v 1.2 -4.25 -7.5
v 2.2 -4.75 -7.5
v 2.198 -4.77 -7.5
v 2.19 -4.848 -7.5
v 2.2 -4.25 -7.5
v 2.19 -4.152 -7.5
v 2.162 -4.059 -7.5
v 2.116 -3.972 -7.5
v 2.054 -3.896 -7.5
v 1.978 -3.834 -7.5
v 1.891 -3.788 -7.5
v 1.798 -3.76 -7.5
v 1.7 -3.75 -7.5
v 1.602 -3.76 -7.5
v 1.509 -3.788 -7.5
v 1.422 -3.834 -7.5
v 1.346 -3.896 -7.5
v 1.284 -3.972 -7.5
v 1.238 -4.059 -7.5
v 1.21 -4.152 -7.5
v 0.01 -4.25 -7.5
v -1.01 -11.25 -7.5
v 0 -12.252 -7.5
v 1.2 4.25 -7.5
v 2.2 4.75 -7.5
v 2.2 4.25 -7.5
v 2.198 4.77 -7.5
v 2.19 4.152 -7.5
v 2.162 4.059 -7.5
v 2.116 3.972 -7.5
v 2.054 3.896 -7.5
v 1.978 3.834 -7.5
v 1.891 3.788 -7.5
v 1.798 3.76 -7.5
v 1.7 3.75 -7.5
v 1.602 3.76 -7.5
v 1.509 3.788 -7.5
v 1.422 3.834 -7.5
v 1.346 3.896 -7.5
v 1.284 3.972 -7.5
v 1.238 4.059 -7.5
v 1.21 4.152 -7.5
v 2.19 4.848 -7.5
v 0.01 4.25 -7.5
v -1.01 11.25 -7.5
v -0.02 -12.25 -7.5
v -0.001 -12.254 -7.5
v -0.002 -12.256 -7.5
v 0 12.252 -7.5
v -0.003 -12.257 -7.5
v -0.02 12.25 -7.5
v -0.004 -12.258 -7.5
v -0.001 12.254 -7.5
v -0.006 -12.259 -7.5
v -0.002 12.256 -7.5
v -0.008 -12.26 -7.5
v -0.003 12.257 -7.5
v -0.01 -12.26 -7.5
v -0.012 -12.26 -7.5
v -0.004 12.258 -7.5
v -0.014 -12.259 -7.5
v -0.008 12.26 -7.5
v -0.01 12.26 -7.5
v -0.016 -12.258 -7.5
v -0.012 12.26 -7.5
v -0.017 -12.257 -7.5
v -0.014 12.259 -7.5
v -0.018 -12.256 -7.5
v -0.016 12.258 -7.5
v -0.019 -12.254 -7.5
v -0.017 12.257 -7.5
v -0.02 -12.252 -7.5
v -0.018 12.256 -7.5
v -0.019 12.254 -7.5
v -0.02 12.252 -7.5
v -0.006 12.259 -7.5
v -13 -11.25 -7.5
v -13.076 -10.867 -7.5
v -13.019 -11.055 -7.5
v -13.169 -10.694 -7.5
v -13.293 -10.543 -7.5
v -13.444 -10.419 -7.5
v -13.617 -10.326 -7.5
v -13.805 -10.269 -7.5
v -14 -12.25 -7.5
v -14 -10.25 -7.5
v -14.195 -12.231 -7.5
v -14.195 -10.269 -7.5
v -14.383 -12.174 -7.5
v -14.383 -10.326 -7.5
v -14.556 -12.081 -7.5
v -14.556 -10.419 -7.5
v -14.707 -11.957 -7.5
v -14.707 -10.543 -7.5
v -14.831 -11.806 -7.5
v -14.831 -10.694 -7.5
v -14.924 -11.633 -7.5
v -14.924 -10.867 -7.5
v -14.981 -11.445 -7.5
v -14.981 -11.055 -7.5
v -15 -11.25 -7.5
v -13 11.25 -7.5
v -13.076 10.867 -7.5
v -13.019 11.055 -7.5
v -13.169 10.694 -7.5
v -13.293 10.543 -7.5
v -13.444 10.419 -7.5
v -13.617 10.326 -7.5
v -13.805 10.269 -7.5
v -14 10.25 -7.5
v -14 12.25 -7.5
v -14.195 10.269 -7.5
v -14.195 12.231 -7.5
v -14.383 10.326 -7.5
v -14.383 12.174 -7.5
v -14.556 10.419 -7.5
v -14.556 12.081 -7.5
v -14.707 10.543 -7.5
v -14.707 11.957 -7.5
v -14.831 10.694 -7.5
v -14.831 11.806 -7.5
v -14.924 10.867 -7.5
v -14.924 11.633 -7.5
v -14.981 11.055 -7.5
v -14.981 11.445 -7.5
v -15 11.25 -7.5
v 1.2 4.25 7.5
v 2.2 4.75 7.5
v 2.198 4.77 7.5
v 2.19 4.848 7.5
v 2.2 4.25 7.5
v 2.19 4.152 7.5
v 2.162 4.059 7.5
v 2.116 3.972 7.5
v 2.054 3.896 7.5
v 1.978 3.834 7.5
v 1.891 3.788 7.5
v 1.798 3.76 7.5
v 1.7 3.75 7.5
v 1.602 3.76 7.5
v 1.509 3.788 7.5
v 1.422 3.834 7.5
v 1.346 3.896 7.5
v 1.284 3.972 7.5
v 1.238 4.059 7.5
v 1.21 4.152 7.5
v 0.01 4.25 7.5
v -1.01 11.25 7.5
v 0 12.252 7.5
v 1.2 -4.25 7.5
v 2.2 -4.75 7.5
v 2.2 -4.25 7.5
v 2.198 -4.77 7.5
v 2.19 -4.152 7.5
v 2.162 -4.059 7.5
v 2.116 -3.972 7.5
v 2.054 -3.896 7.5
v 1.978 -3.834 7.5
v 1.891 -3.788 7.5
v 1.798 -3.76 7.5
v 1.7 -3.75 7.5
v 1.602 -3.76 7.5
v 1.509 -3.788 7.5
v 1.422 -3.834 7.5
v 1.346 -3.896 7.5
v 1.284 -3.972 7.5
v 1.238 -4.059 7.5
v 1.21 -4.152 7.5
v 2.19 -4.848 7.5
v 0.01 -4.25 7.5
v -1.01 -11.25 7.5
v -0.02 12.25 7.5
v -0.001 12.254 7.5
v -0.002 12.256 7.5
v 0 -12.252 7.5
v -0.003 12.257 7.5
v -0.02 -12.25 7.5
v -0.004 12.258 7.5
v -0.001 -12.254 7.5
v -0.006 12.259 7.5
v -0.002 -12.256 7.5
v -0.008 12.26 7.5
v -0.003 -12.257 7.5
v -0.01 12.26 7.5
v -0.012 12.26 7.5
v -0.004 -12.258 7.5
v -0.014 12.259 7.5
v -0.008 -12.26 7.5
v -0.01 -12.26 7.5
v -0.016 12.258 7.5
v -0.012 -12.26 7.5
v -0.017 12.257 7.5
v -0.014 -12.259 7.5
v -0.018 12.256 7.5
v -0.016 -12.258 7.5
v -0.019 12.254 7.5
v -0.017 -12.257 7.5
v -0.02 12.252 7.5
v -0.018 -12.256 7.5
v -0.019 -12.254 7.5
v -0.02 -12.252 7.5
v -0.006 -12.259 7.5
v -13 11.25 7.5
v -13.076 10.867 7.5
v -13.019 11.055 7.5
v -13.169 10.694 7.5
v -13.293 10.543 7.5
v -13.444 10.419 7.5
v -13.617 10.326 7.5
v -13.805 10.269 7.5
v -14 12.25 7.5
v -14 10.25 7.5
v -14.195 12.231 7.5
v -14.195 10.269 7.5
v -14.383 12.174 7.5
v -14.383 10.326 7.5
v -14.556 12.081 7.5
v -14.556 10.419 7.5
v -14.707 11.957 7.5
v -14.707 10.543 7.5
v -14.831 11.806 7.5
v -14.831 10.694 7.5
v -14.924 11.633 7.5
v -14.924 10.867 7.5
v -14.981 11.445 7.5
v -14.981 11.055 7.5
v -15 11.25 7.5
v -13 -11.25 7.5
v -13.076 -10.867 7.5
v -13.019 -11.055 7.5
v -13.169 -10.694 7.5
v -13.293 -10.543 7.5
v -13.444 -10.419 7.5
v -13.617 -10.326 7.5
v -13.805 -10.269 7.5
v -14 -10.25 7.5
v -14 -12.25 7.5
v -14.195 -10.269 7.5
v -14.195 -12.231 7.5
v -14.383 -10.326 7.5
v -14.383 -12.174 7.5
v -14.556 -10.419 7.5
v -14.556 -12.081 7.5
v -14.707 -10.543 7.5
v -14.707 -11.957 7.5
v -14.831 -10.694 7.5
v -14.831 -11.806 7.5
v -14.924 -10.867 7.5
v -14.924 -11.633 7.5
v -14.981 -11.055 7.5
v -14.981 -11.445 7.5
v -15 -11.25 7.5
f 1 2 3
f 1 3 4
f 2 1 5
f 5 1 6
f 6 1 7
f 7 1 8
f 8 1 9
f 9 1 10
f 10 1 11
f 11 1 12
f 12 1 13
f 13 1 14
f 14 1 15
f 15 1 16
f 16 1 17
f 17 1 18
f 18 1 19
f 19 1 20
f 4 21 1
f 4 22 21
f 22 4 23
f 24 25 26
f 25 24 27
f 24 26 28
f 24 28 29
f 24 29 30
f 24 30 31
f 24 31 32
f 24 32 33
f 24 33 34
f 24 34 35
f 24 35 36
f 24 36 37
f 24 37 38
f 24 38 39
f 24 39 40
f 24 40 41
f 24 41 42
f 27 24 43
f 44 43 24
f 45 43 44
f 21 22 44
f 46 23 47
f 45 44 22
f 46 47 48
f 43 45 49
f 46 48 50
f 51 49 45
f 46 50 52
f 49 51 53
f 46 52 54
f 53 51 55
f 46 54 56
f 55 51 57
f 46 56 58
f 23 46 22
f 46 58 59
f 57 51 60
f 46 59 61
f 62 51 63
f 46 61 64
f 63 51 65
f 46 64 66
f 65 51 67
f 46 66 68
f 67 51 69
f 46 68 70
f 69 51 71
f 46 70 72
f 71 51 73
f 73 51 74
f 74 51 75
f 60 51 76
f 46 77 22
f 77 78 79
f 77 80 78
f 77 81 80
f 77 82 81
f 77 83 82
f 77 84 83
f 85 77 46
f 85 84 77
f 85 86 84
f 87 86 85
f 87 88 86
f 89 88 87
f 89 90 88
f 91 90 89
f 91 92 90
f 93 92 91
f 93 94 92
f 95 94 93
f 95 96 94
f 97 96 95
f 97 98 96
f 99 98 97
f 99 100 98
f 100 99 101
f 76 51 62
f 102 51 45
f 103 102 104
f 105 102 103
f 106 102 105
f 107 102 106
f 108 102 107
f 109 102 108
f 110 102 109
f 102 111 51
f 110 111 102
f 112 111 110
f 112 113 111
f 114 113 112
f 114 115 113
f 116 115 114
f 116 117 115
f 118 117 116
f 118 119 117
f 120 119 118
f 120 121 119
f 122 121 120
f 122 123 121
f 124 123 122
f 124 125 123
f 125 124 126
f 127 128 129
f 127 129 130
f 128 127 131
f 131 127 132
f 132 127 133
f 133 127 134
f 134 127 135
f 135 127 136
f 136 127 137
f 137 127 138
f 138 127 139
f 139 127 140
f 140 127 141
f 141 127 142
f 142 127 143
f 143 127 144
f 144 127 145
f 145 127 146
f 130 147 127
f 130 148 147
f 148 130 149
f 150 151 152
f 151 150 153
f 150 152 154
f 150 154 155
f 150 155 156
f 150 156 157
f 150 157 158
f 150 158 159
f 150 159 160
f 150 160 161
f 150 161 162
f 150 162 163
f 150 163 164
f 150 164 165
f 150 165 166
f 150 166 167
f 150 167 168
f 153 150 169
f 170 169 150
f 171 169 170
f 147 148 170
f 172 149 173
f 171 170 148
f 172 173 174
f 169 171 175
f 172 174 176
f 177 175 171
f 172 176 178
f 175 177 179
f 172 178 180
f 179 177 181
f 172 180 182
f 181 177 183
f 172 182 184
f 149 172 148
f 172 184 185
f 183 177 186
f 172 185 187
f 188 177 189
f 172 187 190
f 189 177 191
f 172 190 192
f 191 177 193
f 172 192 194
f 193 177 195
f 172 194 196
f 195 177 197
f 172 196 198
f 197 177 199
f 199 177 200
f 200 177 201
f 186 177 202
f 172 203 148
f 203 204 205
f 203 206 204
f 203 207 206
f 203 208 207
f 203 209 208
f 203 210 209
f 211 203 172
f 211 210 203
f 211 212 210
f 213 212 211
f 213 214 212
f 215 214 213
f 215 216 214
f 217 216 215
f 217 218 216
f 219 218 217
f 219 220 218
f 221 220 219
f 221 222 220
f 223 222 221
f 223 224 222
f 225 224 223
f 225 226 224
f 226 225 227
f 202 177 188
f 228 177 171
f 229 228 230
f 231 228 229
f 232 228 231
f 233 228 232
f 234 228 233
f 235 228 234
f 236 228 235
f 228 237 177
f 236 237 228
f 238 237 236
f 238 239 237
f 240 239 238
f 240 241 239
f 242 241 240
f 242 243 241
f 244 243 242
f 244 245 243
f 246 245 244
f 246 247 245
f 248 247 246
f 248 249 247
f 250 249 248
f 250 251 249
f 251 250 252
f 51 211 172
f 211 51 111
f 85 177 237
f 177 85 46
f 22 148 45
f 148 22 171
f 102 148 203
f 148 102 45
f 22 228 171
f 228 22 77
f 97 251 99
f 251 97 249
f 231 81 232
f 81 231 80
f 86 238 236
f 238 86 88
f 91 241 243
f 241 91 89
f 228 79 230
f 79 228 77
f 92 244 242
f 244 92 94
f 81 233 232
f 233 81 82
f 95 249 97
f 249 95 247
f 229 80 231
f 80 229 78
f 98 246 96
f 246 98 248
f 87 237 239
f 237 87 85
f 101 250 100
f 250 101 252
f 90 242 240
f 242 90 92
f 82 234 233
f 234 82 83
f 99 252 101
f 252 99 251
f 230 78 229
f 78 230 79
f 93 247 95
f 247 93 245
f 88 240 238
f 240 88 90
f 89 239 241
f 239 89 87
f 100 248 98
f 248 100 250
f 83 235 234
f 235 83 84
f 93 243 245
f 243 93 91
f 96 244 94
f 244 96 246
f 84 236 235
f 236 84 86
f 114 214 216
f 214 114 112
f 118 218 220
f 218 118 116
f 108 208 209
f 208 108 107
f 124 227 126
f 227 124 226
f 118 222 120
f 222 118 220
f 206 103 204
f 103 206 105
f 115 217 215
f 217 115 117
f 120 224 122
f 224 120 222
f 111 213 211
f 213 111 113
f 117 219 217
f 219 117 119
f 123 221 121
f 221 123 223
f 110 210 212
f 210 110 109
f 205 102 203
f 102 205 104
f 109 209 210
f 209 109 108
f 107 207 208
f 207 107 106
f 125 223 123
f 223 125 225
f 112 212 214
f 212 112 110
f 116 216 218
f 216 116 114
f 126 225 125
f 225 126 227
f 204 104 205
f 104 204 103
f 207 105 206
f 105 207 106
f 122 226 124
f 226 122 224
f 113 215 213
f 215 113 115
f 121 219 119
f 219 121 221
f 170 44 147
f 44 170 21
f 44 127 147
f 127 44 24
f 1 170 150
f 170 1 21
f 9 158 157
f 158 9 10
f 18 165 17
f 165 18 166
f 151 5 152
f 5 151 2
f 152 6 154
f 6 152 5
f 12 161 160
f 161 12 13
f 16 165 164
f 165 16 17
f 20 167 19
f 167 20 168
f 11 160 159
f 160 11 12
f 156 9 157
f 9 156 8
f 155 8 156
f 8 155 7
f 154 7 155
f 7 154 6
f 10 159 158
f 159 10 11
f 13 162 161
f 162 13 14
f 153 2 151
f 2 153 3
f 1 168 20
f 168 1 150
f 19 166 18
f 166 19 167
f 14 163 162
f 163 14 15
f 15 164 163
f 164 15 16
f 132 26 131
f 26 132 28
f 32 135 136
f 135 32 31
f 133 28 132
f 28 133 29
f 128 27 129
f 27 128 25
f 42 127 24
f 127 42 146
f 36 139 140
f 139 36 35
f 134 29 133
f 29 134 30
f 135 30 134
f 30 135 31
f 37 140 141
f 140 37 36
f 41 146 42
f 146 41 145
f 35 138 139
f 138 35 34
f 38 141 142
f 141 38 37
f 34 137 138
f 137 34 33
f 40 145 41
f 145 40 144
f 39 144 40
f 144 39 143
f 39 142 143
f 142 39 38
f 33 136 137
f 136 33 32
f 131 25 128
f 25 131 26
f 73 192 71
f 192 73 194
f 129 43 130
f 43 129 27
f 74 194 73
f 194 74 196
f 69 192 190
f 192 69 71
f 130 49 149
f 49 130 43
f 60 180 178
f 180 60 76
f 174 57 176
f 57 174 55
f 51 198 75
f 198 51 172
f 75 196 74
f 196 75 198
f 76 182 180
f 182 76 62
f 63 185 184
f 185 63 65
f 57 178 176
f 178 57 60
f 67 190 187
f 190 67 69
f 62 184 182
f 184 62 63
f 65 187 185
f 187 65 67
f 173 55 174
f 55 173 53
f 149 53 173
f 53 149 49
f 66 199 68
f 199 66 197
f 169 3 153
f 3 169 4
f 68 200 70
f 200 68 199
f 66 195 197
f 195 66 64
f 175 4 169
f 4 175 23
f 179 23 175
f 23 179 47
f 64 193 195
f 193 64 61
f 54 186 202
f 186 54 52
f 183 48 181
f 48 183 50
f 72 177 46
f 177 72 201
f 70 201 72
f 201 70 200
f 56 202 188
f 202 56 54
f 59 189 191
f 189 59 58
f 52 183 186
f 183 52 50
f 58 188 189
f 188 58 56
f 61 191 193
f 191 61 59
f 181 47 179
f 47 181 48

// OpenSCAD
// Parametric LED Strip Holder for Board Edges
// https://www.thingiverse.com/thing:3496300
// by Bike Cyclist
// https://www.thingiverse.com/Bikecyclist


// Width of the clamped board
w_board = 22.5;

// Net height of the clamped length
h_board = 12;

// Radius of the clamping-end cylinder
r_board = 1;

// Width of the LED strip (including tolerance)
w_led = 8.5;

// Height of the LED strip (including tolerance)
h_led = 1.2;

// Radius of the LED strip retaining arc
r_led = 0.5;

// Thickness of the clamp features
th_clamp = 1;

// Length of the clamp
l_clamp = 15;

// Number of facets
$fn = 32;

// Small distance to ensure proper meshing
eps = 0.01;

rotate ([0, 90, 0])
{
    halfclamp (w_board, h_board, r_board, 0);

    translate ([0, 0, -th_clamp])
    mirror ([0, 0, 1])
    halfclamp (w_led, h_led, r_led);
    
    if (w_led < w_board)
    {
        chamfer ();
        
        mirror ([0, 1, 0])
        chamfer ();
    }
}

module chamfer ()
{
    hull ()
    {
        translate ([0, w_board/2 + th_clamp, -eps])
        rotate ([0, 90, 0])
        cylinder (r = eps, h = l_clamp, center = true);
        
        translate ([0, w_led/2 + th_clamp/2, -eps])
        rotate ([0, 90, 0])
        cylinder (r = eps, h = l_clamp, center = true);
        
        translate ([0, w_led/2 + th_clamp - r_led, h_led + r_led])
        rotate ([0, 90, 0])
        cylinder (r = r_led, h = l_clamp, center = true);
    }
    
    hull ()
    {
        translate ([0, w_led/2 + th_clamp/2, h_led + r_led])
        rotate ([0, 90, 0])
        cylinder (r = r_led, h = l_clamp, center = true);
    }
}

module halfclamp (width, free_height, r_corner)
{
    height = free_height + r_corner + th_clamp;
    d_corner = th_clamp - r_corner;
    
    translate ([0, 0, -height])
    {
        difference ()
        {
            ccube ([l_clamp, width + 2 * th_clamp, height]);
            
            epsdown ()
            ccube ([l_clamp + 2 * eps, width, height - th_clamp]);
        }

        for (i = [-1, 1])
            translate ([0, i * ((width + 2 * th_clamp)/2 - r_corner), 0])
            rotate ([0, 90, 0])
            hull ()
            {
                cylinder (d = 2 * r_corner, h = l_clamp, center = true);
                
                translate ([0, -i * d_corner, 0])
                cylinder (d = 2 * r_corner, h = l_clamp, center = true);
            }
    }
}

module ccube (dim)
{
    translate ([0, 0, dim[2]/2])
    cube ([dim [0], dim [1], dim [2]], center = true);
}

module epsdown (n = 1)
{
    translate ([0, 0, -n * eps])
    children ();
}
